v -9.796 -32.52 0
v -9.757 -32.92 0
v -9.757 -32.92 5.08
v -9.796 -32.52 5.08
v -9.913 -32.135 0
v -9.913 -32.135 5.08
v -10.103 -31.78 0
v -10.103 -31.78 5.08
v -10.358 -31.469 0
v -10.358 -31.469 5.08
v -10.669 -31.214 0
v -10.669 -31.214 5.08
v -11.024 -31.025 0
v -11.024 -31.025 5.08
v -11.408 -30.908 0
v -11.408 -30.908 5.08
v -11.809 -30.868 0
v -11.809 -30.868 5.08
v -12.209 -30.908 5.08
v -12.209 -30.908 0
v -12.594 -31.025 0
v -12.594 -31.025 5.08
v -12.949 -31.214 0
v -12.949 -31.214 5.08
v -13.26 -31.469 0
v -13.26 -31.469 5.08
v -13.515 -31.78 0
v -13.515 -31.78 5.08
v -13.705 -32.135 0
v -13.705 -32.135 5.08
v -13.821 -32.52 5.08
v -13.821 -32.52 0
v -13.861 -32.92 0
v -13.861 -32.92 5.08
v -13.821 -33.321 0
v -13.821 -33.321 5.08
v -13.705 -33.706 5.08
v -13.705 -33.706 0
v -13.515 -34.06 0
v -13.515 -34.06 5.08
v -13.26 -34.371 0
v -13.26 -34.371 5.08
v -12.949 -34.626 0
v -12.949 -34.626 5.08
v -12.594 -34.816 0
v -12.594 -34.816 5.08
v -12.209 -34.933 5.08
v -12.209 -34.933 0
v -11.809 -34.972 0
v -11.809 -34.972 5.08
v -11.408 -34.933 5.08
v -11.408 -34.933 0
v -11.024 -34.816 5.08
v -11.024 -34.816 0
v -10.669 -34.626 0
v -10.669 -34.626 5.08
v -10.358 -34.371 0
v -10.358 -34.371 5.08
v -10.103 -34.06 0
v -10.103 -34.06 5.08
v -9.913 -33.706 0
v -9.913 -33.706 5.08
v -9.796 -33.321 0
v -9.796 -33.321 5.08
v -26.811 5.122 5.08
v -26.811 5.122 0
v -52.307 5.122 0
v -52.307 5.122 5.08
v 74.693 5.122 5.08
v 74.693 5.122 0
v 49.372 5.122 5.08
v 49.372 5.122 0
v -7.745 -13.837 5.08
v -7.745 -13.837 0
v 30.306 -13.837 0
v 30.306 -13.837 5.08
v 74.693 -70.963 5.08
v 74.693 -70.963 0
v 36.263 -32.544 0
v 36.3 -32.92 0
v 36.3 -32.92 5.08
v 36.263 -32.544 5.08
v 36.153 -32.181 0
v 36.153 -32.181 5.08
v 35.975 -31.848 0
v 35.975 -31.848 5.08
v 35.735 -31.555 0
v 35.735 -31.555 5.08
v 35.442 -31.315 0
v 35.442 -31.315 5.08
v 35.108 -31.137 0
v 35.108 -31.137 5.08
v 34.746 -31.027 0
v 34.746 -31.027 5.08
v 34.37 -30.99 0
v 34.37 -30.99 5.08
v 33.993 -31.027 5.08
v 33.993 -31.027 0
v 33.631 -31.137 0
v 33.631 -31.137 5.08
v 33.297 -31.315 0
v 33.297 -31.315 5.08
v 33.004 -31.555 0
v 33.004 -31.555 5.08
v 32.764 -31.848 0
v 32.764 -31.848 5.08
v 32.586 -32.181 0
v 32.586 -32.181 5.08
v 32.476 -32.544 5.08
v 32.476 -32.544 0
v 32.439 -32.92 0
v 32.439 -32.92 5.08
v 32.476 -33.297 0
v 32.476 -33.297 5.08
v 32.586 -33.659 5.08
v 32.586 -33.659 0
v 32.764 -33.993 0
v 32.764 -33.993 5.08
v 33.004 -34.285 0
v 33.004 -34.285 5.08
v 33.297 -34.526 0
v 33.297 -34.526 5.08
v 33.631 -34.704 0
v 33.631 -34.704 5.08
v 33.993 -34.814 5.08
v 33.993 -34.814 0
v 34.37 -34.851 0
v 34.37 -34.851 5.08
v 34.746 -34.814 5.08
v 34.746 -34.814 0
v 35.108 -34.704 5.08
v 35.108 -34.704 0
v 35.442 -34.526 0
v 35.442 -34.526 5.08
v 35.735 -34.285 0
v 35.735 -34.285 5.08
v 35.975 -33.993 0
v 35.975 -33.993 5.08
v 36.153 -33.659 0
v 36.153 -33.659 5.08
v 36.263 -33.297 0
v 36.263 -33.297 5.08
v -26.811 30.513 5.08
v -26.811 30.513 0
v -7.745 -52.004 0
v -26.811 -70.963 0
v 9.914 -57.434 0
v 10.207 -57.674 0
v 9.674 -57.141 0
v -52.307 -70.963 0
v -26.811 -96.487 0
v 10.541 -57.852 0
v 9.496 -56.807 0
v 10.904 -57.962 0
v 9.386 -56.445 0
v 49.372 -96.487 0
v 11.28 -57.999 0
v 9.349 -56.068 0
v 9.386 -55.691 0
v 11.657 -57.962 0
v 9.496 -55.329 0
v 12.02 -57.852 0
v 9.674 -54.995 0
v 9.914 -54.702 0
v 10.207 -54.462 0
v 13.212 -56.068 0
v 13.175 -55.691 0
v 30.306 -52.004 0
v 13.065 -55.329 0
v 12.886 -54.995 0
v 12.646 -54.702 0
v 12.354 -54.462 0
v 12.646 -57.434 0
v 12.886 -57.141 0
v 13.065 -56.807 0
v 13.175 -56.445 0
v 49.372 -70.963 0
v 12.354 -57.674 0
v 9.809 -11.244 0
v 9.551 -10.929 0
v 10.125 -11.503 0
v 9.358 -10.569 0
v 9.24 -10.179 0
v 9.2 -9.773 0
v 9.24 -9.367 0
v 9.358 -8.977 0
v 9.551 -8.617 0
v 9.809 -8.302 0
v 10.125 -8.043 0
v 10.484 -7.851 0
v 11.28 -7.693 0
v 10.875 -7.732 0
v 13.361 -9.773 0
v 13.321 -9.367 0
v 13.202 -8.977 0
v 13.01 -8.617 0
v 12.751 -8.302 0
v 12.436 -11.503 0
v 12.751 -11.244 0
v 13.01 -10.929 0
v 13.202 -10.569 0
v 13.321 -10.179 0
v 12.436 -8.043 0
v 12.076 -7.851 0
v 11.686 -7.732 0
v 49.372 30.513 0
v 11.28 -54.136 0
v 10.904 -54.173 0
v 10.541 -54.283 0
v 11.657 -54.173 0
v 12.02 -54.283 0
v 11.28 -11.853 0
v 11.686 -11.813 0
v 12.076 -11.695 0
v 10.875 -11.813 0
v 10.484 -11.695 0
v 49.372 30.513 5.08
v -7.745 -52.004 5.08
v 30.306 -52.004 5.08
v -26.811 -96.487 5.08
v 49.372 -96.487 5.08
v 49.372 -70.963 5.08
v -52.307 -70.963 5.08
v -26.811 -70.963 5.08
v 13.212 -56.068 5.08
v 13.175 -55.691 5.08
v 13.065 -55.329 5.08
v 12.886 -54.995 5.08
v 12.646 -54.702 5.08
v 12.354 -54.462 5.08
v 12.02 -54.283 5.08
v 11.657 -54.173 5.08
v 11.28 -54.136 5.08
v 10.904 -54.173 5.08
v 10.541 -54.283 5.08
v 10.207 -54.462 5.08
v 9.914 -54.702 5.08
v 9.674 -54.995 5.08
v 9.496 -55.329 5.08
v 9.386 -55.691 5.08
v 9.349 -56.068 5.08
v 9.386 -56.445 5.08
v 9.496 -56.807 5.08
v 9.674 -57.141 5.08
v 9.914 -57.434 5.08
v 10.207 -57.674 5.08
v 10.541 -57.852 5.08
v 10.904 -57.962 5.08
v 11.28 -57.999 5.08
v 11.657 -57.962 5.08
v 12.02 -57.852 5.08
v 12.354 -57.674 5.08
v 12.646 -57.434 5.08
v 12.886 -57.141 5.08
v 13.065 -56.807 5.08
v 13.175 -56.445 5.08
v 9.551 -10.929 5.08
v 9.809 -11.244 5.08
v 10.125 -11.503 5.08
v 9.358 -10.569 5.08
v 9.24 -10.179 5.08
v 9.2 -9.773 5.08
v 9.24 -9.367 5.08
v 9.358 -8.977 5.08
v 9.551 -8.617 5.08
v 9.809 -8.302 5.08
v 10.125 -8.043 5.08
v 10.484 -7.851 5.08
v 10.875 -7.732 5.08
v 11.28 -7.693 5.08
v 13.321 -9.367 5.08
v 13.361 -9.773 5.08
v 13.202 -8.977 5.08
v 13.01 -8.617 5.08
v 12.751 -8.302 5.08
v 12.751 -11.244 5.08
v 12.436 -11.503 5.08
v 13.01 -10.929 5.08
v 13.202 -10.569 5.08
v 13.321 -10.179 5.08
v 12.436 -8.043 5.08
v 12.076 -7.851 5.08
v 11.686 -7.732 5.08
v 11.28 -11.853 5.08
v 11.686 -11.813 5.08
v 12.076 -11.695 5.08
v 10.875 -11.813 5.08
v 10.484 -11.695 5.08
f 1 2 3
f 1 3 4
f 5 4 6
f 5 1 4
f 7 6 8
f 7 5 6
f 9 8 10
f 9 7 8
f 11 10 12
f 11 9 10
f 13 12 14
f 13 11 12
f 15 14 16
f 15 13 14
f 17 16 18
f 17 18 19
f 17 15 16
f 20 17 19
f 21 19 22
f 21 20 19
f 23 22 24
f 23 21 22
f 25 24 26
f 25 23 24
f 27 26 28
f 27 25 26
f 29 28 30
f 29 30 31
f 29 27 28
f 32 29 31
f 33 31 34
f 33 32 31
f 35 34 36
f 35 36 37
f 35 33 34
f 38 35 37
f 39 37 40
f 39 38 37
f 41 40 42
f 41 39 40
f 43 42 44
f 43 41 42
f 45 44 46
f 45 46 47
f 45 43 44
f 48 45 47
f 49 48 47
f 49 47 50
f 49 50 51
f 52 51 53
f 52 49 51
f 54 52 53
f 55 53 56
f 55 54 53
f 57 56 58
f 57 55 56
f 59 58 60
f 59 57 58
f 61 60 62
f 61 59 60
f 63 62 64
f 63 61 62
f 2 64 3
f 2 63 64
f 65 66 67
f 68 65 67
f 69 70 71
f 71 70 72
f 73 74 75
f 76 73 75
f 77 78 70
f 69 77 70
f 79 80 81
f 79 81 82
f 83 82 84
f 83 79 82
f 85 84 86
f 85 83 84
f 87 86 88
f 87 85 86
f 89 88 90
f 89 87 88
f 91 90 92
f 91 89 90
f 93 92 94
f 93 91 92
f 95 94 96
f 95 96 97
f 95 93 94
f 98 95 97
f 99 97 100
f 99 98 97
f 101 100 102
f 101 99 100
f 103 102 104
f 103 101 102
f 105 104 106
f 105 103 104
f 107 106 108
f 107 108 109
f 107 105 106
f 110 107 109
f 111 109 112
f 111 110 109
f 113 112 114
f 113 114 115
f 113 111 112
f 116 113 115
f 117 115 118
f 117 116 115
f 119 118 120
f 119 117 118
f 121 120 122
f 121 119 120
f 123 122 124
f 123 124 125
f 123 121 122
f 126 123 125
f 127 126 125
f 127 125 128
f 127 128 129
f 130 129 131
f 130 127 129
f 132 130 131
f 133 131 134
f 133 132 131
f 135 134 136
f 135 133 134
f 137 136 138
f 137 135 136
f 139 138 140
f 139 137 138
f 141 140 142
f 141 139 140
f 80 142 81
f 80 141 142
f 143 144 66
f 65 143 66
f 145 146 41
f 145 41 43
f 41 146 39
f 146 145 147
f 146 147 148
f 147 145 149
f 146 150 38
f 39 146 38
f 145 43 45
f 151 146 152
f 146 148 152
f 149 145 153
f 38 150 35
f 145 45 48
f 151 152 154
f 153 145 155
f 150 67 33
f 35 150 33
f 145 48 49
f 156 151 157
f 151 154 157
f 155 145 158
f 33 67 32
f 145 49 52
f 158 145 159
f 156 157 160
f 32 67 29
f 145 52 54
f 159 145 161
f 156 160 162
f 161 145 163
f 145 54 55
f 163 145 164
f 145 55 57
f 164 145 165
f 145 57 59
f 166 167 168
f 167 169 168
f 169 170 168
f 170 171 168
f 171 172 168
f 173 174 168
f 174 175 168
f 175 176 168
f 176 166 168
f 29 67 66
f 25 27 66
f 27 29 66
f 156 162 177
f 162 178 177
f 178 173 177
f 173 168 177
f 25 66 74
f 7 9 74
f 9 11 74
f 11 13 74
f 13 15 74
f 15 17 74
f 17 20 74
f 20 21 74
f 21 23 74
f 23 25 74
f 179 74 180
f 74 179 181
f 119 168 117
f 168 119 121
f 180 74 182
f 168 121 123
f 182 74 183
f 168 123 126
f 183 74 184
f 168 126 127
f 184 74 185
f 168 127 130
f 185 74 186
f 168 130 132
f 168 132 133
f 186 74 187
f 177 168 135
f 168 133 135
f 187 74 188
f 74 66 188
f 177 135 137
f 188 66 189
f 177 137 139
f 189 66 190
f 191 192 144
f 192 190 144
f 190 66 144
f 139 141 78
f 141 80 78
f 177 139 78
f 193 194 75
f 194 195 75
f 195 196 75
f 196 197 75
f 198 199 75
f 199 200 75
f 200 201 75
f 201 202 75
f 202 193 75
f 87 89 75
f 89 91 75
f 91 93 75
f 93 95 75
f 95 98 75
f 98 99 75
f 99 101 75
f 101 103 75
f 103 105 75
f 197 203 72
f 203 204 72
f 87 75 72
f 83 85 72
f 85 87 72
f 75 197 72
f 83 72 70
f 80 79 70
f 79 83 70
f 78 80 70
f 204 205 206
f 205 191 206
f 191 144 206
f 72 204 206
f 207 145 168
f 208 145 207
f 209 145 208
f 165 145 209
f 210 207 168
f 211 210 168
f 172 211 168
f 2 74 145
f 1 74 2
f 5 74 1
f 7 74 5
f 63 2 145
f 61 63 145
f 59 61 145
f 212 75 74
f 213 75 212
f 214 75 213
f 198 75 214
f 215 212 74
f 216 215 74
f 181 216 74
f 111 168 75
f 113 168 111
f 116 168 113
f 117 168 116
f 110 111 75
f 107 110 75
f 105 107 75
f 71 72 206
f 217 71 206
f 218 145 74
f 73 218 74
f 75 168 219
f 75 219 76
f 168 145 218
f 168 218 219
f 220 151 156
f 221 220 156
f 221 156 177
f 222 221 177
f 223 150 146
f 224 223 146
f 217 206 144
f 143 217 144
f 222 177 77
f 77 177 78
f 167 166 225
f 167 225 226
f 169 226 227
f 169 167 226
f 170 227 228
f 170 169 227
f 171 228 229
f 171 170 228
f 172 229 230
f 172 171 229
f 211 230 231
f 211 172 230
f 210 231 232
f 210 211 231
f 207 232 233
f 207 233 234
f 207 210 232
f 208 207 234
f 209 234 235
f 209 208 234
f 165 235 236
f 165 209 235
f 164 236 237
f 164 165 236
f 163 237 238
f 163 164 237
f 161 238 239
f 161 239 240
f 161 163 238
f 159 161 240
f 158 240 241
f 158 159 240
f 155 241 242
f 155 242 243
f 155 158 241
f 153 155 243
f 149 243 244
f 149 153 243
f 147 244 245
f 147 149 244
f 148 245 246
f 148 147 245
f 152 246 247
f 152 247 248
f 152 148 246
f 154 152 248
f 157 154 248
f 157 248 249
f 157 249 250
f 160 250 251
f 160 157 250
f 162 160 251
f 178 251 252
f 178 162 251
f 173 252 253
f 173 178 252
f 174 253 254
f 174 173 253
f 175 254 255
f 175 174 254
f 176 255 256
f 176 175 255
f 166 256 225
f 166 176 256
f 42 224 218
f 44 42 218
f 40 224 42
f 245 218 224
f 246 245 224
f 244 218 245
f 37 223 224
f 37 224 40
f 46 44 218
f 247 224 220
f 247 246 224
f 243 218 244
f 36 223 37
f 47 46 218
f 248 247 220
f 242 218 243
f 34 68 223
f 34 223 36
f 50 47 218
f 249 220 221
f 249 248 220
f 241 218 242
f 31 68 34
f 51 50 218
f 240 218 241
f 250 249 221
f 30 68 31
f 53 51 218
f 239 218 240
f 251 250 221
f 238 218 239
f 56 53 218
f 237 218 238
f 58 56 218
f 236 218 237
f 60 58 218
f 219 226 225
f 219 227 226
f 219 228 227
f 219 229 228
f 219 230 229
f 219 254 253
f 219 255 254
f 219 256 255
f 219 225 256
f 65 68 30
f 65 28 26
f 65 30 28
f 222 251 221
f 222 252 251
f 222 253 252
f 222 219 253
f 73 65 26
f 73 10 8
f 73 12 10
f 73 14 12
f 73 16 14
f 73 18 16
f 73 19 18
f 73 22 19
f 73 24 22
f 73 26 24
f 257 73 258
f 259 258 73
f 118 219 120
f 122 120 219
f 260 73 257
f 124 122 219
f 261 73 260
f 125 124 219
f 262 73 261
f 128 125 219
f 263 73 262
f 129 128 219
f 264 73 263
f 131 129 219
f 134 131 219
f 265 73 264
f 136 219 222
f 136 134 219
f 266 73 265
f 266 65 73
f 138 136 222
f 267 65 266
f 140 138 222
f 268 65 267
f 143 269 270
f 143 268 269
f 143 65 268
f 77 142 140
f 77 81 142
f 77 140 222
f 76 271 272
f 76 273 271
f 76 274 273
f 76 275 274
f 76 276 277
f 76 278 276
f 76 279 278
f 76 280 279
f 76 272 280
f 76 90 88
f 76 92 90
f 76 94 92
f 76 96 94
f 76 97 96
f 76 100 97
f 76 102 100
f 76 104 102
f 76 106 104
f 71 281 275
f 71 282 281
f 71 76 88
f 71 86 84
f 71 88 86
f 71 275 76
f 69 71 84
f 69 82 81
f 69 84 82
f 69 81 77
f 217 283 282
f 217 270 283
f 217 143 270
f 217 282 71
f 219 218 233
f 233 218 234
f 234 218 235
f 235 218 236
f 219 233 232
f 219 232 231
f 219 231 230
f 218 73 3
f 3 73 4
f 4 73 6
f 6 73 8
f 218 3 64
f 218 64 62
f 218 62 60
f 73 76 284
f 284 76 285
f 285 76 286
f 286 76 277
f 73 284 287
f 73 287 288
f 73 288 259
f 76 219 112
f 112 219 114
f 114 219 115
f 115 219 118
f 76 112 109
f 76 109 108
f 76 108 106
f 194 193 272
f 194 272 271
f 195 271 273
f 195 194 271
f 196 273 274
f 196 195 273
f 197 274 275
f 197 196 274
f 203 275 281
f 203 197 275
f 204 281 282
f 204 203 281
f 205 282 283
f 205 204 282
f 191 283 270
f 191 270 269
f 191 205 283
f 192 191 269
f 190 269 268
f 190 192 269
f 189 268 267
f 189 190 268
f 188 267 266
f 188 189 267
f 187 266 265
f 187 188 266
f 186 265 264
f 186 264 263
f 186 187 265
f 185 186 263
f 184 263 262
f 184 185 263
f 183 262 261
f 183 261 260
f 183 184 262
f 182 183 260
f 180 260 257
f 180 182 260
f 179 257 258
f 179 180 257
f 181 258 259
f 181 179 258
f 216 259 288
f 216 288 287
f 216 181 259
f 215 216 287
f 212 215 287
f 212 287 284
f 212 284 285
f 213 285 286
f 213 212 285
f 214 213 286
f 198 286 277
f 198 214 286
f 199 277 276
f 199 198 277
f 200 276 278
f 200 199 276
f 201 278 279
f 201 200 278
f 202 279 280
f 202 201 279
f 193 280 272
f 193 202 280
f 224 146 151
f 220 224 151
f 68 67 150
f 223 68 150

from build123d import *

# Parameters (mm, degrees)
SKETCH2_R           = 2.08028948
SKETCH2_R_2         = 1.930605223
SKETCH2_R_3         = 1.931643465
SKETCH2_R_4         = 2.051960052
SKETCH2_W           = 38.050309674
SKETCH2_H           = 38.166973502
BOSS_EXTRUDE1_DEPTH = 5.08


with BuildPart() as part:
    # Sketch2 → Boss-Extrude1 (new body)
    with BuildSketch(Plane.XY):
        Polygon((49.372044396, 30.512685118), (-26.811291054, 30.512685118), (-26.811291054, 5.122215891), (-52.307460203, 5.122215891), (-52.307460203, -70.962795052), (-26.811291054, -70.962795052), (-26.811291054, -96.487314882), (49.372044396, -96.487314882), (49.372044396, -70.962795052), (74.692539797, -70.962795052), (74.692539797, 5.122215891), (49.372044396, 5.122215891), align=None)
        with Locations((11.280376671, -9.772802829)):
            Circle(SKETCH2_R, mode=Mode.SUBTRACT)
        with Locations((34.369531508, -32.92028958)):
            Circle(SKETCH2_R_2, mode=Mode.SUBTRACT)
        with Locations((11.280376671, -56.067776331)):
            Circle(SKETCH2_R_3, mode=Mode.SUBTRACT)
        with Locations((-11.808778166, -32.92028958)):
            Circle(SKETCH2_R_4, mode=Mode.SUBTRACT)
        with Locations((11.280376671, -32.92028958)):
            Rectangle(SKETCH2_W, SKETCH2_H, mode=Mode.SUBTRACT)
    extrude(amount=BOSS_EXTRUDE1_DEPTH)


solid = part.part
